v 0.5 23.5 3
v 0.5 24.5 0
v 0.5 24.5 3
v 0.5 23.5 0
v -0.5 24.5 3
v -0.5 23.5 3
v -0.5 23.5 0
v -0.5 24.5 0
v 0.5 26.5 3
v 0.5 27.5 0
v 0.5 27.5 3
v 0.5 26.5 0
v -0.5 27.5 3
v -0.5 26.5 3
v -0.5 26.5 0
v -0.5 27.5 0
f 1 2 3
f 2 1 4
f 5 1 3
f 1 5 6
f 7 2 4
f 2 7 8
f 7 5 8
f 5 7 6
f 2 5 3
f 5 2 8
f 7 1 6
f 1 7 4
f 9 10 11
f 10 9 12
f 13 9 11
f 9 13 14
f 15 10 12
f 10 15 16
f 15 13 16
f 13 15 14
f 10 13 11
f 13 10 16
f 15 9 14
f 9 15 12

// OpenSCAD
union() {
    translate([0, 24, 1.5]) cube([1, 1, 3], center=true);
    translate([0, 27, 1.5]) cube([1, 1, 3], center=true);
}
